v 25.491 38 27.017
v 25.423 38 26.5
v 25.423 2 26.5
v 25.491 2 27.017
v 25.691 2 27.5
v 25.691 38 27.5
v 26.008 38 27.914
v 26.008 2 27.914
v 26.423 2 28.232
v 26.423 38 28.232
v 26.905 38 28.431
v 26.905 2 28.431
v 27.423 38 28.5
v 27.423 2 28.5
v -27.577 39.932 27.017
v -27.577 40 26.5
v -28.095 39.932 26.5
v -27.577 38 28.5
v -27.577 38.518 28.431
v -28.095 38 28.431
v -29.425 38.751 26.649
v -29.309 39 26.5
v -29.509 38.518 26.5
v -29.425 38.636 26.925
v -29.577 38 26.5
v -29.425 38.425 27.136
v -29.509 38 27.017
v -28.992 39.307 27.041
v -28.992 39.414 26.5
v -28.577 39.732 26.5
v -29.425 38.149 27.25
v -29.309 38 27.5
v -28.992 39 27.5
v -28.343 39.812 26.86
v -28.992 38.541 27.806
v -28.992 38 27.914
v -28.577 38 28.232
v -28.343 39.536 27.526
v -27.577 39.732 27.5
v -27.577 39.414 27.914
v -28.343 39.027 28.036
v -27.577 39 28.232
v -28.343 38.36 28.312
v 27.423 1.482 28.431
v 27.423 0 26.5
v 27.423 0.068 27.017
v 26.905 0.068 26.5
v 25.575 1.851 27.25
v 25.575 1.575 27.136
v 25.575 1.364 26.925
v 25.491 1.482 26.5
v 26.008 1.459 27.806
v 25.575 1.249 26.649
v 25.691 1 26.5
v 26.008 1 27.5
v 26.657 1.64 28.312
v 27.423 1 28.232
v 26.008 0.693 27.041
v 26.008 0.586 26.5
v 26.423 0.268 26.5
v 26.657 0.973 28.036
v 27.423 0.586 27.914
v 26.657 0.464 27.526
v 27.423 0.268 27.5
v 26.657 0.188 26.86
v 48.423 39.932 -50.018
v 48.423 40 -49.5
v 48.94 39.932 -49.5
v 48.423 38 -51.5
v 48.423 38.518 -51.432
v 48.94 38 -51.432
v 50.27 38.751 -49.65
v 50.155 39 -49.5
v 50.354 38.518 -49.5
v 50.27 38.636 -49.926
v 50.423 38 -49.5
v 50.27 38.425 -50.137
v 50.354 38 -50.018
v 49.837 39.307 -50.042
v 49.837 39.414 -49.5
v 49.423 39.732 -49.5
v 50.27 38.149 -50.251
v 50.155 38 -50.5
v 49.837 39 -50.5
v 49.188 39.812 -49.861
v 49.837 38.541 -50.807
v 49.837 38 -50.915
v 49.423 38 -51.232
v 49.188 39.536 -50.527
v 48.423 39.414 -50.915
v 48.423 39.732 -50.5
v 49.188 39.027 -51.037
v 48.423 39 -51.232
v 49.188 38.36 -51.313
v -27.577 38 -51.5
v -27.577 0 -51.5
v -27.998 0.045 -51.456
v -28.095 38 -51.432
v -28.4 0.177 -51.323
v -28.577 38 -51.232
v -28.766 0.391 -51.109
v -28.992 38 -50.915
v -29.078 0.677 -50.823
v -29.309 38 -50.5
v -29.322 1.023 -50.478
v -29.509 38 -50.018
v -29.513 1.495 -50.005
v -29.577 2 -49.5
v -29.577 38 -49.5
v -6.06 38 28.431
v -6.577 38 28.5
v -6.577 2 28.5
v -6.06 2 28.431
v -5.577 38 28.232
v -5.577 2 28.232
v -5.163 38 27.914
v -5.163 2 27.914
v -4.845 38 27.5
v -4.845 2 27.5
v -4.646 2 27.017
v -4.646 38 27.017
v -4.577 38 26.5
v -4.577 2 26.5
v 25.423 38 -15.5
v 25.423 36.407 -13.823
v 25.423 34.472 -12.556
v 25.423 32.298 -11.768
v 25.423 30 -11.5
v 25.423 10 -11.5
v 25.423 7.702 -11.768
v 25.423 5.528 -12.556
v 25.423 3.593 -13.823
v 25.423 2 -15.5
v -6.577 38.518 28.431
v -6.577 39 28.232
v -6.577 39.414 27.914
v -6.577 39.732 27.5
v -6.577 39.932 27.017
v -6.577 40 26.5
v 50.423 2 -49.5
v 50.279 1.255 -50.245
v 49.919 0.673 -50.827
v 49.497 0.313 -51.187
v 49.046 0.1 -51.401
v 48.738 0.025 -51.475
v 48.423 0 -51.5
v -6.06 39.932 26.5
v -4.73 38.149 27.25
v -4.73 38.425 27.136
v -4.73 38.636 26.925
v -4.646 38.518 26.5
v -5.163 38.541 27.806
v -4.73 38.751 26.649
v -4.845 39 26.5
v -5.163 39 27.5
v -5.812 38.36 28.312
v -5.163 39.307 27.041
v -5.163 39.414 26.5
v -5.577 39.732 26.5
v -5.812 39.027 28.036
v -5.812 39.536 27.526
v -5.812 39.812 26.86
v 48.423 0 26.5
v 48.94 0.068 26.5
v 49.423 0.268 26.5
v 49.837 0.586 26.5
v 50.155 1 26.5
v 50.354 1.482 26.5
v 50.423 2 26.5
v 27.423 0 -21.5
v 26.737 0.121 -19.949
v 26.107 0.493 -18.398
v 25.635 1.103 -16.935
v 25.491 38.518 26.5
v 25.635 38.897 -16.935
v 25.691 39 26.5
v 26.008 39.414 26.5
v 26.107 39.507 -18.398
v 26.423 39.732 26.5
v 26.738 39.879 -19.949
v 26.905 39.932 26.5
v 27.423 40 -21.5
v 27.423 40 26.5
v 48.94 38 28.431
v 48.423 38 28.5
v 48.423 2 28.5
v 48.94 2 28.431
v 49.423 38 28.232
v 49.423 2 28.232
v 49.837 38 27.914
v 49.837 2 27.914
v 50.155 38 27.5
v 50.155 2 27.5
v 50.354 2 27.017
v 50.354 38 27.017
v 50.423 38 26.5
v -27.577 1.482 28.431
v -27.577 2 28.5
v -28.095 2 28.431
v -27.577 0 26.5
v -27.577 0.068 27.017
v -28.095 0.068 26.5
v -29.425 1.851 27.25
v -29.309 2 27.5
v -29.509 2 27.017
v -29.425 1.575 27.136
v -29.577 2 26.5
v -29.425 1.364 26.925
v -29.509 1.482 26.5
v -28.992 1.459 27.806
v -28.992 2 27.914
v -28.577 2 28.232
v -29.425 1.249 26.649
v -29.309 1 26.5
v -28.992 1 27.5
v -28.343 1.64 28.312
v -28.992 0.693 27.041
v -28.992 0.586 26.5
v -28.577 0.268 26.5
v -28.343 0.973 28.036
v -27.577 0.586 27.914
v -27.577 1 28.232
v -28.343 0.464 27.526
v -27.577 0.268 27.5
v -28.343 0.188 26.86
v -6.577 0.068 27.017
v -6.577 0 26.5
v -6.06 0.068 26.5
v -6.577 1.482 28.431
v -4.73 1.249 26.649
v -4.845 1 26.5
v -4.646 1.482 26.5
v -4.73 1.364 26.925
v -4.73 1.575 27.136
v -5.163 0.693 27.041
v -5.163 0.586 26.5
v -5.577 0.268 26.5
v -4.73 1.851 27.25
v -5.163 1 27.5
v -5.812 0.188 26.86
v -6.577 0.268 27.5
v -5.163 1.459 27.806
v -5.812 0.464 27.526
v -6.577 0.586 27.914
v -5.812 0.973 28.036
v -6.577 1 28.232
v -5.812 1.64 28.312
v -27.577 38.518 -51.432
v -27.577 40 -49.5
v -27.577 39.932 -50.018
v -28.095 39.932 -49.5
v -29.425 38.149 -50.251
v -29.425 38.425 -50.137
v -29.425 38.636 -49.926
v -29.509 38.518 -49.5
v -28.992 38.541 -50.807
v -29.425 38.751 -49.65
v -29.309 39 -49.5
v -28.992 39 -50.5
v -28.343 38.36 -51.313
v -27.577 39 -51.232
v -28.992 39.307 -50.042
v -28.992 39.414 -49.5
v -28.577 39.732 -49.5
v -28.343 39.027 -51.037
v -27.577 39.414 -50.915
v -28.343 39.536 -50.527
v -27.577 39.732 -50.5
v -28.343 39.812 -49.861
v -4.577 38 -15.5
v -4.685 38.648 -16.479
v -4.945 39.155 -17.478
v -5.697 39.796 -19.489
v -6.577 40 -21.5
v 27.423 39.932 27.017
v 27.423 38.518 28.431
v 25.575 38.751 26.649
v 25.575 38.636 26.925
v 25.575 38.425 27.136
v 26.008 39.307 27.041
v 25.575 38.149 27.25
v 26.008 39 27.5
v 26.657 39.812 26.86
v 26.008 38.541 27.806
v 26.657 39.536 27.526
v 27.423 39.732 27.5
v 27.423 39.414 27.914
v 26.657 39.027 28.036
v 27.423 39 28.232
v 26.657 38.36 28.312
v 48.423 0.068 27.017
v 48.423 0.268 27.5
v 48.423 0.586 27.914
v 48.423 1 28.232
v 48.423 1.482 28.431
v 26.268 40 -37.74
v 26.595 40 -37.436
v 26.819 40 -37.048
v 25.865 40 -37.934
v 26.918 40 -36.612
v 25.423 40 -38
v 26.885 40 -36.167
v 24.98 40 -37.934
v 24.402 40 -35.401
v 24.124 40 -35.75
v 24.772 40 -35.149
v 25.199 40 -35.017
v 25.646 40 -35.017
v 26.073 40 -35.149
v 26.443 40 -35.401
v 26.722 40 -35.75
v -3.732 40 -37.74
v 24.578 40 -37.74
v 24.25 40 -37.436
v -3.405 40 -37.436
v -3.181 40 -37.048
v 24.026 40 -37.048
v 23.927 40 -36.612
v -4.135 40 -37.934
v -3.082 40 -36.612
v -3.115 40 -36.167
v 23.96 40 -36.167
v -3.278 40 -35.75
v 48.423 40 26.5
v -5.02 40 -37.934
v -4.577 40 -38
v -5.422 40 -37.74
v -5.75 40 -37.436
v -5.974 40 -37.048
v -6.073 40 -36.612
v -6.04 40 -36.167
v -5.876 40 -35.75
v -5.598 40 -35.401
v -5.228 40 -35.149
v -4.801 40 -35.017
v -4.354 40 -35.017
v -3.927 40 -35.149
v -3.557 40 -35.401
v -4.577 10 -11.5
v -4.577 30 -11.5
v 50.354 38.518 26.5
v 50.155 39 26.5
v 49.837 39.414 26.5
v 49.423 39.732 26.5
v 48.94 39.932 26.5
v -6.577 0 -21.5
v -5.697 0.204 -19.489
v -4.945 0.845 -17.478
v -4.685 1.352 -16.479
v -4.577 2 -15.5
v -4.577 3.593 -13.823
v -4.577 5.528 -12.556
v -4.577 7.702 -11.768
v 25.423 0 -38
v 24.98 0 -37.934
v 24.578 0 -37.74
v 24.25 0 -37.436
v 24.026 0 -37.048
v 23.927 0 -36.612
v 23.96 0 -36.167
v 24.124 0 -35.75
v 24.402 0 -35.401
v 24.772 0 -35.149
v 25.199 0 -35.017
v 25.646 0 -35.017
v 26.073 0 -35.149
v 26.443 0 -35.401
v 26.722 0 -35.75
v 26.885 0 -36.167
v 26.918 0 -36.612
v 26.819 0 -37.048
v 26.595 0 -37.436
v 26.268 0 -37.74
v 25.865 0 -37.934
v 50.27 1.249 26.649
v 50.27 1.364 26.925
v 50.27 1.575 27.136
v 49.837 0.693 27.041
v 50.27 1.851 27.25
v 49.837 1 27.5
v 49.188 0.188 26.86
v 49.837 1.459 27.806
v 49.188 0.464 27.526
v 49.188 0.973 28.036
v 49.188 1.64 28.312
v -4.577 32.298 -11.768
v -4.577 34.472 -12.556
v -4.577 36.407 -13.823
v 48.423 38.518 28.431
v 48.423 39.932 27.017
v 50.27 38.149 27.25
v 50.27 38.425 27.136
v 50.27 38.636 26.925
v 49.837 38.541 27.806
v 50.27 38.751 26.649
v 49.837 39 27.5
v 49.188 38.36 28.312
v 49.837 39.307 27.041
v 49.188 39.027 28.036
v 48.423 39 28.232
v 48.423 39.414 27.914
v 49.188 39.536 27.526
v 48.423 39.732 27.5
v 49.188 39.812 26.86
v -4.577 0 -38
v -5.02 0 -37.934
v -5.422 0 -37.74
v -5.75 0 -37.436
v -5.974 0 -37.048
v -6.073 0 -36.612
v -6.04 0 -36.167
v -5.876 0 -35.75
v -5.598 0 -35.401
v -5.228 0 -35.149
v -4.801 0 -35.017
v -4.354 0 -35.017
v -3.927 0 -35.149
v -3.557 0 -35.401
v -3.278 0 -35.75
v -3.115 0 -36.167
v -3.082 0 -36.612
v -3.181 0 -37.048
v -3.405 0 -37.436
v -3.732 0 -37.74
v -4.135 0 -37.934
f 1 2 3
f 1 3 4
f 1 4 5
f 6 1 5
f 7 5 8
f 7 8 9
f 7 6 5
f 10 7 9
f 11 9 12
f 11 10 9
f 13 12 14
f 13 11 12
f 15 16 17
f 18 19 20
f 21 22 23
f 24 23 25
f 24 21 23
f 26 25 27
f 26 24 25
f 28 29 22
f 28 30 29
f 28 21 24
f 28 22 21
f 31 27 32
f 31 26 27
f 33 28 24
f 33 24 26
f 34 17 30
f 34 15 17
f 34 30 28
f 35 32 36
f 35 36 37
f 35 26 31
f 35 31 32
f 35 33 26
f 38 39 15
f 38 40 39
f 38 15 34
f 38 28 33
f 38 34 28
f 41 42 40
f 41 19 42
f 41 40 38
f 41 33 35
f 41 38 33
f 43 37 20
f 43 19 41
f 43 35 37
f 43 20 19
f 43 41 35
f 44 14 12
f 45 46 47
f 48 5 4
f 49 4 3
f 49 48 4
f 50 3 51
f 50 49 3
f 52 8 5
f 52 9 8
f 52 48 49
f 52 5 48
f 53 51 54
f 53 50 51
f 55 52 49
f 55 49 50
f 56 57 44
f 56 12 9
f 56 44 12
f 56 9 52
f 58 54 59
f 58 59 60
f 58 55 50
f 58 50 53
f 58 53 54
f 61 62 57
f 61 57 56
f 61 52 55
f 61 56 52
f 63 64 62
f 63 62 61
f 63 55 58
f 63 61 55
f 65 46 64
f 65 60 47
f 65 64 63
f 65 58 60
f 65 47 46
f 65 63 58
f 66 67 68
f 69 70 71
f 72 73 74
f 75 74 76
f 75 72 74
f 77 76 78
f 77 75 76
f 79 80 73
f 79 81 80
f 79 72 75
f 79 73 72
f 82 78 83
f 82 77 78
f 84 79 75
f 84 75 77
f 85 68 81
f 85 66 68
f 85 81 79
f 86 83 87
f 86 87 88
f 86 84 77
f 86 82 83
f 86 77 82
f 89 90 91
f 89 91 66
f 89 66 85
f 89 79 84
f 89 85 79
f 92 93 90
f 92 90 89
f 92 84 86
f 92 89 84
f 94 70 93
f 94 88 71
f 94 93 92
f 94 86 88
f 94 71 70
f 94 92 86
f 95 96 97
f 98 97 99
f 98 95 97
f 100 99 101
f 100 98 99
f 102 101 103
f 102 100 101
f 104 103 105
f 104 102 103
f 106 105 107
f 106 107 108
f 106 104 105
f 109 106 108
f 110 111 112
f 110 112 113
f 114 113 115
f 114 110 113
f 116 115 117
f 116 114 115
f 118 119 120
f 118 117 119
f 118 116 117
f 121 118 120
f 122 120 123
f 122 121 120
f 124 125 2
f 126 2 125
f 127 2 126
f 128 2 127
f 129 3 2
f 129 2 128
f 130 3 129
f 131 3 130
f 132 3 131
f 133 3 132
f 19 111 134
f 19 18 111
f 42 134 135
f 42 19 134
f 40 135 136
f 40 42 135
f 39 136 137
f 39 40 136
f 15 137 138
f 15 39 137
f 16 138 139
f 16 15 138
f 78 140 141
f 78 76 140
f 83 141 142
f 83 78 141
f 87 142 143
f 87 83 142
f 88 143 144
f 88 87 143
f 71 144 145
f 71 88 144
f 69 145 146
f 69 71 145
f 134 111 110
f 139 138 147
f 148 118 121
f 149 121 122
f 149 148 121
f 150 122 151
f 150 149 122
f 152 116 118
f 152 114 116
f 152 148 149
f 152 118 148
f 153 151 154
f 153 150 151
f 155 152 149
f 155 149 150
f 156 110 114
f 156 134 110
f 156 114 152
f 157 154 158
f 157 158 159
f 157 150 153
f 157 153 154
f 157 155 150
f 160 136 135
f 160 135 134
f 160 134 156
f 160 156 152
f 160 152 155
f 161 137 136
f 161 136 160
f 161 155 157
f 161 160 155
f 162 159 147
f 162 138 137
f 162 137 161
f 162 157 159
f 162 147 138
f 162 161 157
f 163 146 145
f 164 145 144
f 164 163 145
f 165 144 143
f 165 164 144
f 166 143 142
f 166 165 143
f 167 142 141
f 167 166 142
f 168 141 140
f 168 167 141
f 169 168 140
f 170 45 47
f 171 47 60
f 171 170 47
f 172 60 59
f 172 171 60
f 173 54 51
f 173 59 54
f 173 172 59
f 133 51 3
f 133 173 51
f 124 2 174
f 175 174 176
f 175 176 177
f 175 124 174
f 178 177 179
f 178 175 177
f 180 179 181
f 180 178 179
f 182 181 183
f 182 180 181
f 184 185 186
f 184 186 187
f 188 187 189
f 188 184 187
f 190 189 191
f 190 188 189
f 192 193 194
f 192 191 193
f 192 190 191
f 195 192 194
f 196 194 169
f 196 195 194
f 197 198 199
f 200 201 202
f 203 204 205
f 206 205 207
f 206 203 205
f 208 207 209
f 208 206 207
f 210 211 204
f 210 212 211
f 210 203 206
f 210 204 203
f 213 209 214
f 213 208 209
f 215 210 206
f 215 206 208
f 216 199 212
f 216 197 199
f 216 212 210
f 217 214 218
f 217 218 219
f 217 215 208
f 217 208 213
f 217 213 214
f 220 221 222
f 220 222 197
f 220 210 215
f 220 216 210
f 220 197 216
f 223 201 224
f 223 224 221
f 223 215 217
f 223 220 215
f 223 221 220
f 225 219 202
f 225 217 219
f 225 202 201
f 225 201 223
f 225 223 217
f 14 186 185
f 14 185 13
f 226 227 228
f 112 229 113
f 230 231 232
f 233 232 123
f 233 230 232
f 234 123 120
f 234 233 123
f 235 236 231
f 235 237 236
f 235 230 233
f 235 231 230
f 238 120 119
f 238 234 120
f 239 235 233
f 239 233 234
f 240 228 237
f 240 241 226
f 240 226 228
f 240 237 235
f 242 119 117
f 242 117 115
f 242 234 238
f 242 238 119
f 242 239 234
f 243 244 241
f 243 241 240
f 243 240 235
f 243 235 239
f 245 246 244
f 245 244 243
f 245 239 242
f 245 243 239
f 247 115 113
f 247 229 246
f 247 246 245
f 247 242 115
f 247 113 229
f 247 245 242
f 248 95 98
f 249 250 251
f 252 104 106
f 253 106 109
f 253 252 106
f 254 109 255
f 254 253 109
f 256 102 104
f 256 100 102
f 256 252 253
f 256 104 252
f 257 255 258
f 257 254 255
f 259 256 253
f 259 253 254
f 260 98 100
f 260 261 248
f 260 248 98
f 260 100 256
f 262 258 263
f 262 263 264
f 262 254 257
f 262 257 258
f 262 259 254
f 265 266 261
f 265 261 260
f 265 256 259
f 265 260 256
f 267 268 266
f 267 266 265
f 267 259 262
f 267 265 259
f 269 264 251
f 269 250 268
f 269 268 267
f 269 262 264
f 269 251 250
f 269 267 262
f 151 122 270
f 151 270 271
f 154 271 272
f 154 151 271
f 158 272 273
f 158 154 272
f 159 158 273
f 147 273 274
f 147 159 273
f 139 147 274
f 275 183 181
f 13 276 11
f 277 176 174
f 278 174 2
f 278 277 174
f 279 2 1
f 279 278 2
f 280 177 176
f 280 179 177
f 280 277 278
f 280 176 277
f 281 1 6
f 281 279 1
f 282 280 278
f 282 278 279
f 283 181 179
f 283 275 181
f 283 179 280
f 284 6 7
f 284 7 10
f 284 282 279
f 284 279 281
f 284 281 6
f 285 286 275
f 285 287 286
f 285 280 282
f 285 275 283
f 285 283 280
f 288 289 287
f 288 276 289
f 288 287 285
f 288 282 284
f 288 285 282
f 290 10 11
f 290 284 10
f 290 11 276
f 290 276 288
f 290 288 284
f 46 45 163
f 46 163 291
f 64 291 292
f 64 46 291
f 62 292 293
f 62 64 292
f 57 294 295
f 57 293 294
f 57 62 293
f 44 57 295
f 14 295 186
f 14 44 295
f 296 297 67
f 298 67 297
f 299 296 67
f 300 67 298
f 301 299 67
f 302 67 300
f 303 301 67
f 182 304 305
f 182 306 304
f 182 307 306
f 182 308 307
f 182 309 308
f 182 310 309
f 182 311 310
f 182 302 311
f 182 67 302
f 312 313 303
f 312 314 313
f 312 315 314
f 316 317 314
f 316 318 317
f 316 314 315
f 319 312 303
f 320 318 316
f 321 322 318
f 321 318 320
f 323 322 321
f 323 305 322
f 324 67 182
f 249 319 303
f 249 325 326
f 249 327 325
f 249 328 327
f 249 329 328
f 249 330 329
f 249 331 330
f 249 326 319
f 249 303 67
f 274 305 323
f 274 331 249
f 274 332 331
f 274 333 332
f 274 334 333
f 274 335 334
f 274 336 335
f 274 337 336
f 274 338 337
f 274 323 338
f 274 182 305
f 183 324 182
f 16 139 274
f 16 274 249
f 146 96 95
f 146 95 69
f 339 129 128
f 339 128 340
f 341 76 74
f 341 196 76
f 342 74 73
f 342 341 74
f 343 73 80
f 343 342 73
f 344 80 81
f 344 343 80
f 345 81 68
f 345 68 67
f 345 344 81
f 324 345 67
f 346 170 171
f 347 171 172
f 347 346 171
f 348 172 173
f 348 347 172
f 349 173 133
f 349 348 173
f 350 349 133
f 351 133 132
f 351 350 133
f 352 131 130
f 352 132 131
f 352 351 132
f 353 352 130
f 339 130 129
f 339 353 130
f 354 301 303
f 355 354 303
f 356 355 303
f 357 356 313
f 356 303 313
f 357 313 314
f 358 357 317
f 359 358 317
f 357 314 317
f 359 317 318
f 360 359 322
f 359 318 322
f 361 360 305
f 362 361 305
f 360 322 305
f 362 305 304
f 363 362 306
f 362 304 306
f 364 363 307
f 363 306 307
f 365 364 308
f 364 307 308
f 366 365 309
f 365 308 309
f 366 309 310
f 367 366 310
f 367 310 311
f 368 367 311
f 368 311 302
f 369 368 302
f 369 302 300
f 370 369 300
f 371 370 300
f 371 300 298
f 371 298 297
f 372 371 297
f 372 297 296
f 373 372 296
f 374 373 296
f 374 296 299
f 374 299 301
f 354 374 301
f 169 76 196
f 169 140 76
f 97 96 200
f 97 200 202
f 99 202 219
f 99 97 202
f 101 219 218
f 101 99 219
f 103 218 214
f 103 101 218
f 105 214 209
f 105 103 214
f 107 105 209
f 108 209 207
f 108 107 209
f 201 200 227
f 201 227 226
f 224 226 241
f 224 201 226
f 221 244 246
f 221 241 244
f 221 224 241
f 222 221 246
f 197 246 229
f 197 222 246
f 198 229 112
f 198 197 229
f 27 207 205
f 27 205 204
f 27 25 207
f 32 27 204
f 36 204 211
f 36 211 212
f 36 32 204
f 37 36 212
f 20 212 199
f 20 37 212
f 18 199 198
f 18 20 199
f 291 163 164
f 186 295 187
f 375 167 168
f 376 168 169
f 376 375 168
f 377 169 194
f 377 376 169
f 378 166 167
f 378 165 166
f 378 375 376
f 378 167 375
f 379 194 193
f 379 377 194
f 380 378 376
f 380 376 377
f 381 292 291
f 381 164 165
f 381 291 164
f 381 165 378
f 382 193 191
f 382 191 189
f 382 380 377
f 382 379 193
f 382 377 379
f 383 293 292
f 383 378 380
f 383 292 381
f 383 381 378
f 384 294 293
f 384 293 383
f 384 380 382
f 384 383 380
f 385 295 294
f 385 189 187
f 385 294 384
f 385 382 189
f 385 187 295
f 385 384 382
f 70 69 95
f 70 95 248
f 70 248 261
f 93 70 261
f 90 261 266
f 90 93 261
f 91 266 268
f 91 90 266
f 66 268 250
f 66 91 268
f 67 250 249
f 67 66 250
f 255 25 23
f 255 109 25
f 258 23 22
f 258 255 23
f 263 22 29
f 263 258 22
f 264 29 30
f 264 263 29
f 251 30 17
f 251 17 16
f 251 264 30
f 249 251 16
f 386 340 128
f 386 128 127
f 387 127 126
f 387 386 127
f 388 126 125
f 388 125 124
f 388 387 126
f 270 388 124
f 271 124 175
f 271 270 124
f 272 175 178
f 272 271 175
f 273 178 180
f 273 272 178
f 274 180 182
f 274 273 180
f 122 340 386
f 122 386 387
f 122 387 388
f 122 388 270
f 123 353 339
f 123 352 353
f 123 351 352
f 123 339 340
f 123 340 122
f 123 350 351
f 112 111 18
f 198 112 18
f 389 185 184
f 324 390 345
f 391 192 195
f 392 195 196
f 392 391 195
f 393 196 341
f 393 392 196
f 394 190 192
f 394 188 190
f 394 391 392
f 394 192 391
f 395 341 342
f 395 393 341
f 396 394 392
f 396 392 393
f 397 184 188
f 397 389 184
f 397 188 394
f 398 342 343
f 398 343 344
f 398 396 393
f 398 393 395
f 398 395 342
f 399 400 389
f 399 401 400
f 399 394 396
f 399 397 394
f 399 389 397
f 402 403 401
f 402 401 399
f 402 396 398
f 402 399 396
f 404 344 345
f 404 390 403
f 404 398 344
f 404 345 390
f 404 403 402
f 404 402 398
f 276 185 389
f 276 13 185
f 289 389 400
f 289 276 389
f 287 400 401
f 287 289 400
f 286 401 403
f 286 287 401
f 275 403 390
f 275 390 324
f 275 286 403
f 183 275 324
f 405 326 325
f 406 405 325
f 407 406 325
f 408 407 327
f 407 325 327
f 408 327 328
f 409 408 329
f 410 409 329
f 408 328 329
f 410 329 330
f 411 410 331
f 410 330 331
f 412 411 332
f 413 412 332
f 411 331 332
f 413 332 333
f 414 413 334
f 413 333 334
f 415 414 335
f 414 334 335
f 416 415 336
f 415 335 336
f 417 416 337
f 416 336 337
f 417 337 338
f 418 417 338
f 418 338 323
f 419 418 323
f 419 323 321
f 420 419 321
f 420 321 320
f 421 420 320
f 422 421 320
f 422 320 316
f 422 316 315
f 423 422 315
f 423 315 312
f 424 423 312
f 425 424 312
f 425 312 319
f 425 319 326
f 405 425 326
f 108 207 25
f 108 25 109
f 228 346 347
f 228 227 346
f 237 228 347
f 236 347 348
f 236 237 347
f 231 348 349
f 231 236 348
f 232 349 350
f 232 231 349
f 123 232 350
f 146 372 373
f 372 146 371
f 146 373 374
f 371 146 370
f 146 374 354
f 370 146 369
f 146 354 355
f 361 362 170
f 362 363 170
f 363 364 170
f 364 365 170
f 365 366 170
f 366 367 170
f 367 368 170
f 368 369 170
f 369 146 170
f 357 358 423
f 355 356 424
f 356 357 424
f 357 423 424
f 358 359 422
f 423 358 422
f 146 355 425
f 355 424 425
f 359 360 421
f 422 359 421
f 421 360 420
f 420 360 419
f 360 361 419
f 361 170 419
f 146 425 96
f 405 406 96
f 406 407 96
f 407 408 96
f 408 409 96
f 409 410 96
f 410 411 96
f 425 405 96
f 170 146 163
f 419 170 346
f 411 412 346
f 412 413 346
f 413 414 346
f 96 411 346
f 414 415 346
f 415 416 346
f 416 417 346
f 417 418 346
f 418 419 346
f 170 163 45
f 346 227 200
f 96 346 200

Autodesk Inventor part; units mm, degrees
ref_plane "YZ Plane" through (0, 0, 0) normal (1, 0, 0) x (0, 1, 0)
ref_plane "XZ Plane" through (0, 0, 0) normal (0, 1, 0) x (-1, 0, 0)
ref_plane "XY Plane" through (0, 0, 0) normal (0, 0, 1) x (1, 0, 0)
sketch "Эскиз1" plane through (0, 0, 0) normal (0, 1, 0) x (-1, 0, 0)
  line L0 (29.5774, -51.5004) -> (-50.4226, -51.5004)
  line L1 (-50.4226, -51.5004) -> (-50.4226, 28.4996)
  line L2 (-50.4226, 28.4996) -> (-25.4226, 28.4996)
  line L3 (-25.4226, 28.4996) -> (-25.4226, -11.5004)
  line L4 (-25.4226, -11.5004) -> (4.5774, -11.5004)
  line L5 (4.5774, -11.5004) -> (4.5774, 28.4996)
  line L6 (4.5774, 28.4996) -> (29.5774, 28.4996)
  line L7 (29.5774, 28.4996) -> (29.5774, -51.5004)
  point P0 (0, 0)
  dimension "d0" = 30
  dimension "d1" = 80
  dimension "d2" = 40
  dimension "d3" = 80
extrude "Выдавливание1" add sketch "Эскиз1" along normal blind 40
fillet "Сопряжение1" radius 10 2 edges at (10.4226, 40, -11.5004) (10.4226, 0, -11.5004)
fillet "Сопряжение2" radius 2 19 edges at (10.4226, 40, -51.5004) (-29.5774, 20, -51.5004) (50.4226, 20, -51.5004) (-17.0774, 40, 28.4996) (37.9226, 40, 28.4996) (37.9226, 0, 28.4996) (-17.0774, 0, 28.4996) (-4.5774, 40, 8.4996) (-29.5774, 40, -11.5004) (-29.5774, 0, -11.5004) (-29.5774, 20, 28.4996) (-4.5774, 20, 28.4996) (25.4226, 40, 8.4996) (25.4226, 20, 28.4996) (25.4226, 0, 8.4996) (-4.5774, 0, 8.4996) (50.4226, 20, 28.4996) (50.4226, 0, -11.5004) (50.4226, 40, -11.5004)
sketch "Эскиз2" plane through (0, 0, 0) normal (0, -1, 0) x (1, 0, 0)
  line L0 (-29.5774, 26.4996) -> (-29.5774, -49.5004) projected
  line L1 (-27.5774, -51.5004) -> (48.4226, -51.5004) projected
  point P0 (0, 0)
  point P1 (-4.5774, -36.5004)
  point P2 (25.4226, -36.5004)
  dimension "d8" = 30
  dimension "d9" = 25
  dimension "d10" = 15
hole "Отверстие1" at (-4.5774, 0, -36.5004) at (25.4226, 0, -36.5004) direction (0, 1, 0) diameter 3 end through all
properties part number "stand_holder"
